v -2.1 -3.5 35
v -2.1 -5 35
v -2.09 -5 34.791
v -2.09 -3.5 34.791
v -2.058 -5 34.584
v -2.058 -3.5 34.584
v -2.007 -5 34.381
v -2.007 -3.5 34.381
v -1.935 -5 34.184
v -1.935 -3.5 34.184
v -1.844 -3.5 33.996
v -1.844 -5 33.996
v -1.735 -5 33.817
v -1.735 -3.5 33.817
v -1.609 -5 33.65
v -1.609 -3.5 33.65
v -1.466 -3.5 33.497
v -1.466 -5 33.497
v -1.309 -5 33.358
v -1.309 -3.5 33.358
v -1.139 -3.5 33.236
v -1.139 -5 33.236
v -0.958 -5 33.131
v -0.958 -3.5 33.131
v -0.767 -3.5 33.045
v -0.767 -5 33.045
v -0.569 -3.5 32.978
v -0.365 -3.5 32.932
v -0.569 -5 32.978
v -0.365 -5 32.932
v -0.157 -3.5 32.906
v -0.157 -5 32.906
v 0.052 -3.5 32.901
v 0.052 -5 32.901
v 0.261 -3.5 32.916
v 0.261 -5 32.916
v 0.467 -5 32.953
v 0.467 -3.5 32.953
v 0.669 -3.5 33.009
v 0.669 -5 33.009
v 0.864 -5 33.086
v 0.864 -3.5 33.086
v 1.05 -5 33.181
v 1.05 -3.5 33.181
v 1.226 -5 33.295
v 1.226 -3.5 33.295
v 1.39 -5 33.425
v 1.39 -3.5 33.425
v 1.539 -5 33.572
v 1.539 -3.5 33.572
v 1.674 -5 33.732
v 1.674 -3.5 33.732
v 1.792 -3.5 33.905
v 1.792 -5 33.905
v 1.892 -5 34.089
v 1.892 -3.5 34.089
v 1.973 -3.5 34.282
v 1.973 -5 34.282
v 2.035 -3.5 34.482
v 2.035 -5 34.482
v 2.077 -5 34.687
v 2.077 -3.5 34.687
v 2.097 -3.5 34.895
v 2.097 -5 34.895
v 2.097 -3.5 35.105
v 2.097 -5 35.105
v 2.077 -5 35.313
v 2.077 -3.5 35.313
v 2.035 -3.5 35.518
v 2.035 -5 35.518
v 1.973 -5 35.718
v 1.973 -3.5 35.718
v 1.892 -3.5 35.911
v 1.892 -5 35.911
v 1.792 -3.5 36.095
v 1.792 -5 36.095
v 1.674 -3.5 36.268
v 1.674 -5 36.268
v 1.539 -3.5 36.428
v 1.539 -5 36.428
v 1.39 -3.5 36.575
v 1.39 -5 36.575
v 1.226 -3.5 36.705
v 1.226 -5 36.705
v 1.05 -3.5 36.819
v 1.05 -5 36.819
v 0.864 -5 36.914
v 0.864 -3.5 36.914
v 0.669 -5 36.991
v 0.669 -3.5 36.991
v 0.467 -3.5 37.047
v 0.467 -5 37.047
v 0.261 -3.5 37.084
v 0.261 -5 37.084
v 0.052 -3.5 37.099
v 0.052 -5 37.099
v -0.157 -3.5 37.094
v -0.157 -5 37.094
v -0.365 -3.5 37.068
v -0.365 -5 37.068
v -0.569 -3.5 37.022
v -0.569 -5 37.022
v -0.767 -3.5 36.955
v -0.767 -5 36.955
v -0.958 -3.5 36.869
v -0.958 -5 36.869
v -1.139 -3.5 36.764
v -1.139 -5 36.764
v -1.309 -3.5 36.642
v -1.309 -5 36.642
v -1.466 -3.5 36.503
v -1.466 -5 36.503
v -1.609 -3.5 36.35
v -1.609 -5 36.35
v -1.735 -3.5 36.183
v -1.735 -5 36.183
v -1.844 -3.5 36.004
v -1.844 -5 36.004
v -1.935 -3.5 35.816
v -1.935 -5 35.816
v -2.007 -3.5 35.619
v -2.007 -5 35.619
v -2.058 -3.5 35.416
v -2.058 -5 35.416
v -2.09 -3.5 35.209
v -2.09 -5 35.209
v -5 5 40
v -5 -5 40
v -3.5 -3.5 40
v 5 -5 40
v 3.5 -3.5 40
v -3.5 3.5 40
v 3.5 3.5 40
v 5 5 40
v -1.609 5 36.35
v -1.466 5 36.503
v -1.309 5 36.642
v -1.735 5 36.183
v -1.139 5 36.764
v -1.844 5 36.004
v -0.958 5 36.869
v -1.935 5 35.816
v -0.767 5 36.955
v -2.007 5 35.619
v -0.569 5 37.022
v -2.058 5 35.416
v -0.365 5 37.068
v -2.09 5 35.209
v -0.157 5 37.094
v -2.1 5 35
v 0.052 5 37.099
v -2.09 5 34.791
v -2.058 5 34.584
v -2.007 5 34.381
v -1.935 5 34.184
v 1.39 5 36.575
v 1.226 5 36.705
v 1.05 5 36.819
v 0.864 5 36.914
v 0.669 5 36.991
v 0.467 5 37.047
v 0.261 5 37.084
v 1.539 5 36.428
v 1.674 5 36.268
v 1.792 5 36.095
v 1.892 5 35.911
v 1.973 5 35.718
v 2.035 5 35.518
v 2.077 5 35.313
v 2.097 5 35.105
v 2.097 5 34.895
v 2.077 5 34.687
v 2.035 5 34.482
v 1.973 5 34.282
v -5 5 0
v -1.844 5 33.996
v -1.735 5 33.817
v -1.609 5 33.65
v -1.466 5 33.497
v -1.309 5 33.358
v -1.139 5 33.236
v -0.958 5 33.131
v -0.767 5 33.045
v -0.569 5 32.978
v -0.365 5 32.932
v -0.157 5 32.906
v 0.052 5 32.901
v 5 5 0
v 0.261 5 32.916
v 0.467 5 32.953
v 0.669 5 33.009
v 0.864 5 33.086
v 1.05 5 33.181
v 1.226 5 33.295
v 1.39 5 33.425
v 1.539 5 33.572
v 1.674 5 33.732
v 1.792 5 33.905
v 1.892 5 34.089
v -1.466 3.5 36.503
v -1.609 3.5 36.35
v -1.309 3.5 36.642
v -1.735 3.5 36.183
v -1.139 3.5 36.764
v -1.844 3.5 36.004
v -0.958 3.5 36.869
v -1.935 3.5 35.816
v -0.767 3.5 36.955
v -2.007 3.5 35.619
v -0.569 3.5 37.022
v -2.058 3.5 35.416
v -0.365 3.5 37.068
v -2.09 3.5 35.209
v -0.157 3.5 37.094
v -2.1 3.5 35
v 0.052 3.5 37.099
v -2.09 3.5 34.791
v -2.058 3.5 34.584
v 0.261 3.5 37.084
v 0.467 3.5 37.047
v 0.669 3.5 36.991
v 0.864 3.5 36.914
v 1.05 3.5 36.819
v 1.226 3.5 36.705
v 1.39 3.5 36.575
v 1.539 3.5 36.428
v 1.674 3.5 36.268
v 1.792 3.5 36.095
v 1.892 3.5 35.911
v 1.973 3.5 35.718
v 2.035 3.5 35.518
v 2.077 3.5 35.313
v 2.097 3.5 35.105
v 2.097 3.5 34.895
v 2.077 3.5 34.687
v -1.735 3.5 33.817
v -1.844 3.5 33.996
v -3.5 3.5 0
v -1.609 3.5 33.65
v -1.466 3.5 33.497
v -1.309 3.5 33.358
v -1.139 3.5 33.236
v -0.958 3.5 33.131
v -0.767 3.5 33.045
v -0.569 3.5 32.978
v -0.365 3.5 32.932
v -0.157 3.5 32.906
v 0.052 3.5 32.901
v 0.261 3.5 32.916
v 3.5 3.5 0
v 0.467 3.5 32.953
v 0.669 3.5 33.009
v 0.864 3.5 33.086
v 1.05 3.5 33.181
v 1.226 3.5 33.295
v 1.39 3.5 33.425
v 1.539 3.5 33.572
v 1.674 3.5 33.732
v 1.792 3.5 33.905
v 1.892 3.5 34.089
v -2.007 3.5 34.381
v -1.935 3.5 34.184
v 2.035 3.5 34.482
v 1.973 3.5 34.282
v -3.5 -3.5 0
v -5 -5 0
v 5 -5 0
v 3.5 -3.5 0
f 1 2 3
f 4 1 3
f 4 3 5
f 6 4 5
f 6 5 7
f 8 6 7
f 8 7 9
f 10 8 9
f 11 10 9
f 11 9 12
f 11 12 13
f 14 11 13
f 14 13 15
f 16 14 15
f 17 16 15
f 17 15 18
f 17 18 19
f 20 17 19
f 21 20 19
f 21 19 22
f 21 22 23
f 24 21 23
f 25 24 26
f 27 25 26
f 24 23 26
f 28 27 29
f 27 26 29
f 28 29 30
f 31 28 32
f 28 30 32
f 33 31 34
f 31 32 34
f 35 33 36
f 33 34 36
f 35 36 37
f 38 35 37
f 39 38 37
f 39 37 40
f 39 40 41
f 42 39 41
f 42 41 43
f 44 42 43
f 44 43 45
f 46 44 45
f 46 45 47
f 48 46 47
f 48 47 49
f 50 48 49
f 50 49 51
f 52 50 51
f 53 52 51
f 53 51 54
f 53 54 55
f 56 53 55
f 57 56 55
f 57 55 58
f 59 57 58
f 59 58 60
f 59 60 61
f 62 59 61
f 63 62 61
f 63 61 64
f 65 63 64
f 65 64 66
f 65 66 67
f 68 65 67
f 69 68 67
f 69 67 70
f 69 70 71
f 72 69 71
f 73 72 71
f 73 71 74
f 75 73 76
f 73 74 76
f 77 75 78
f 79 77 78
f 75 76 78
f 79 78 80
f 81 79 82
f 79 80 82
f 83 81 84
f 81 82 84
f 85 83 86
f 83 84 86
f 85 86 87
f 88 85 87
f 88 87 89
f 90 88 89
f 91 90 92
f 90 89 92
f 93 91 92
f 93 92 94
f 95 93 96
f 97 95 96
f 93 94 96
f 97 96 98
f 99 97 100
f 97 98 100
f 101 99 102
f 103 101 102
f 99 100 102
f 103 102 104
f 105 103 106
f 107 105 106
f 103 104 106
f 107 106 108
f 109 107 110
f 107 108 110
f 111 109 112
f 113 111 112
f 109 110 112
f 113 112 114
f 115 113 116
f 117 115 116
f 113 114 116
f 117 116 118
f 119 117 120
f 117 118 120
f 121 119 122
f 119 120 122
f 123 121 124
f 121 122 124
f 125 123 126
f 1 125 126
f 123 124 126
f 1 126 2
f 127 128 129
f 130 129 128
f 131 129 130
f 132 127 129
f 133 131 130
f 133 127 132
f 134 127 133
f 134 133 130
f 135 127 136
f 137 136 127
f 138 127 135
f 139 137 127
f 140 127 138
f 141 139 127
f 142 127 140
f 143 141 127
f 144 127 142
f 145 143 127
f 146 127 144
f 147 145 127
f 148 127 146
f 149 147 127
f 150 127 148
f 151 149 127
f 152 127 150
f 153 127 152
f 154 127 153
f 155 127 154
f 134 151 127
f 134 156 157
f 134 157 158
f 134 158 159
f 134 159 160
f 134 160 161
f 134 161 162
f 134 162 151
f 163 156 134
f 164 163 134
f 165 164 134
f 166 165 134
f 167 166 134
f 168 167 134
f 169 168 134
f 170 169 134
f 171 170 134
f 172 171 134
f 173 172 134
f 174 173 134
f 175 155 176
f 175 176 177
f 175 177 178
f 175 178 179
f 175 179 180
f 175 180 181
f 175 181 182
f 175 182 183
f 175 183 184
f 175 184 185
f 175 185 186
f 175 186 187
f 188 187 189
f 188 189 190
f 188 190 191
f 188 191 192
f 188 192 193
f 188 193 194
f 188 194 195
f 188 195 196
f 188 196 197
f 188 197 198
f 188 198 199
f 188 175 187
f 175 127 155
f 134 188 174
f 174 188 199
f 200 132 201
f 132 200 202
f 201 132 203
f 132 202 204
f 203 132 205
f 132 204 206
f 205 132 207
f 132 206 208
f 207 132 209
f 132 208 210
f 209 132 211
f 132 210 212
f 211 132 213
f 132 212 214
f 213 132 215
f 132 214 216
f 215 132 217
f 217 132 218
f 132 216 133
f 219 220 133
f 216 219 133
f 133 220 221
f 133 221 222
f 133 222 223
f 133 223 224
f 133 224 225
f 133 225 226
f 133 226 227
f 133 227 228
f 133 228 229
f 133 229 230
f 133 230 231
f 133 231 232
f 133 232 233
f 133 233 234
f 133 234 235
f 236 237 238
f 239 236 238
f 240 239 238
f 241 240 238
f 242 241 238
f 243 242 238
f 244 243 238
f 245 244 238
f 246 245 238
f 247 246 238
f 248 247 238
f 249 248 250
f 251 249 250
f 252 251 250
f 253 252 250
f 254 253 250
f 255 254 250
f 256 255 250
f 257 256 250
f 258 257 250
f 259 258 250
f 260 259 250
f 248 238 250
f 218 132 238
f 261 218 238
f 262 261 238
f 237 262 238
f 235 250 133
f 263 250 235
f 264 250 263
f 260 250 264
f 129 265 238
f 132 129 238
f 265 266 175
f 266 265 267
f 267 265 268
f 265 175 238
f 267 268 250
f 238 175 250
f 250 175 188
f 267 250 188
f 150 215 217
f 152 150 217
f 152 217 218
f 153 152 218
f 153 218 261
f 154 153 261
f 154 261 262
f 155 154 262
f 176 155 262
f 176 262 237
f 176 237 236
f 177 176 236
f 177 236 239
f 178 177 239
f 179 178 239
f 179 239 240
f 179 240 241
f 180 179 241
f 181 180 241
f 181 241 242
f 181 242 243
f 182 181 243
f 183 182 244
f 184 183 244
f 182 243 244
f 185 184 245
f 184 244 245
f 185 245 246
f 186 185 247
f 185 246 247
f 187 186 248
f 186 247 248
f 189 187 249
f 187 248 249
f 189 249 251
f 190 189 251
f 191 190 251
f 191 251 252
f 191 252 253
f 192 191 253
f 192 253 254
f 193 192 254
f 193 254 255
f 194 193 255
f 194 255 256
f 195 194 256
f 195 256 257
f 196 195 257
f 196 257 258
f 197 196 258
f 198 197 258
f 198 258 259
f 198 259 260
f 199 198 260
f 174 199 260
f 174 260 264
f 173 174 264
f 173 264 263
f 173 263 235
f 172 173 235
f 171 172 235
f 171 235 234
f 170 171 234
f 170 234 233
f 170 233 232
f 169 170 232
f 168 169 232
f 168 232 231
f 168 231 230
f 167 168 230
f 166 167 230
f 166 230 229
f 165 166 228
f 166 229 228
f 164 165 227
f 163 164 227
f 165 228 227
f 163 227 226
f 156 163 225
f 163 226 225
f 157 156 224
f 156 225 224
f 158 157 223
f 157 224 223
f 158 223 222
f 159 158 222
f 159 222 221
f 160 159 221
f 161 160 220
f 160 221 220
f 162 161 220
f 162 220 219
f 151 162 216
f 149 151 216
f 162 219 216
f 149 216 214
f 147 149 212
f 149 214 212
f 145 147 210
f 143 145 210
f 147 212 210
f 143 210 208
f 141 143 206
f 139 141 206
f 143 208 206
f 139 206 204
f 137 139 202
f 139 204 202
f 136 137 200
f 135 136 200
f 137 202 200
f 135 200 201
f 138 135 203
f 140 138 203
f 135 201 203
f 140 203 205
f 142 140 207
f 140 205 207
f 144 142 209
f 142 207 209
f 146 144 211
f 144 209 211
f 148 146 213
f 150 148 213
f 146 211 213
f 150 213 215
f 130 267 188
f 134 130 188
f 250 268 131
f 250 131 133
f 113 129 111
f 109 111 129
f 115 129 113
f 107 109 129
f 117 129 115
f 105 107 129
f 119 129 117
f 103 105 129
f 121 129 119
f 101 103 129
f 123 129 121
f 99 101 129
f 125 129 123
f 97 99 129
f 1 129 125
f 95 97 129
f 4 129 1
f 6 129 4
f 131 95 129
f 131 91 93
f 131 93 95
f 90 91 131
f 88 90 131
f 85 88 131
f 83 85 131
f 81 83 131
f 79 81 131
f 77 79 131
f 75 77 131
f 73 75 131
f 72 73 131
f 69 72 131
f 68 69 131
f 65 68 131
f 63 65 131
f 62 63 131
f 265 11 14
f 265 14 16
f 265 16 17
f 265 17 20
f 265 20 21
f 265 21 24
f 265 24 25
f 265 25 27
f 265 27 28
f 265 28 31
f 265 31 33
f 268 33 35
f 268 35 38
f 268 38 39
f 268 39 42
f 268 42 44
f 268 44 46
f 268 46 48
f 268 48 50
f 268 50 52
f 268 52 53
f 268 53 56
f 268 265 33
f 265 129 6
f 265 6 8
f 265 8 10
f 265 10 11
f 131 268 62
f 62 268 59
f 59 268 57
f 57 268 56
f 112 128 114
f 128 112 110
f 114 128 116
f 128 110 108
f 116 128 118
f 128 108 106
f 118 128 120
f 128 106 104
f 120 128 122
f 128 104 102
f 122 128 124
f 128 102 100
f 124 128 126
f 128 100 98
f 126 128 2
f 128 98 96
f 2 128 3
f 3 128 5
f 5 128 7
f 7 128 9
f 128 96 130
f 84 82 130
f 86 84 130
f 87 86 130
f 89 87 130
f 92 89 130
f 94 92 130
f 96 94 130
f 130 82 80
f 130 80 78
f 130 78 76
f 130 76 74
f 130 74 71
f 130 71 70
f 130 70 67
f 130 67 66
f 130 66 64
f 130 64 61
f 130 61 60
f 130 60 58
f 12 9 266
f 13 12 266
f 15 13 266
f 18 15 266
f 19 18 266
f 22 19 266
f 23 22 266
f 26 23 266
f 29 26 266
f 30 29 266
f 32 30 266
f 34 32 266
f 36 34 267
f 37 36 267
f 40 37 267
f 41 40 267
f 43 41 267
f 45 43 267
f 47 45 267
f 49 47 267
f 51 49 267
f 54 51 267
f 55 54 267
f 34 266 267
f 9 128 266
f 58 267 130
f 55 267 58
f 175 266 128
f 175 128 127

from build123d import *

# Parameters (mm, degrees)
SKETCH_1_W         = 10
SKETCH_1_H         = 10
SKETCH_1_W_2       = 7
SKETCH_1_H_2       = 7
EXTRUDE_1_DEPTH    = 40
HOLE_WIZARD_M5_1_D = 4.2


with BuildPart() as part:
    # 草圖1 → 伸長-薄件1 (new body)
    with BuildSketch(Plane.XY):
        Rectangle(SKETCH_1_W, SKETCH_1_H)
        Rectangle(SKETCH_1_W_2, SKETCH_1_H_2, mode=Mode.SUBTRACT)
    extrude(amount=EXTRUDE_1_DEPTH)

    # M5 螺紋孔1 (through all)
    with Locations(Plane(origin=(0, 5, 0), x_dir=(1, 0, 0), z_dir=(0, 1, 0))):
        with Locations((0, -35)):
            Hole(HOLE_WIZARD_M5_1_D / 2)


solid = part.part
